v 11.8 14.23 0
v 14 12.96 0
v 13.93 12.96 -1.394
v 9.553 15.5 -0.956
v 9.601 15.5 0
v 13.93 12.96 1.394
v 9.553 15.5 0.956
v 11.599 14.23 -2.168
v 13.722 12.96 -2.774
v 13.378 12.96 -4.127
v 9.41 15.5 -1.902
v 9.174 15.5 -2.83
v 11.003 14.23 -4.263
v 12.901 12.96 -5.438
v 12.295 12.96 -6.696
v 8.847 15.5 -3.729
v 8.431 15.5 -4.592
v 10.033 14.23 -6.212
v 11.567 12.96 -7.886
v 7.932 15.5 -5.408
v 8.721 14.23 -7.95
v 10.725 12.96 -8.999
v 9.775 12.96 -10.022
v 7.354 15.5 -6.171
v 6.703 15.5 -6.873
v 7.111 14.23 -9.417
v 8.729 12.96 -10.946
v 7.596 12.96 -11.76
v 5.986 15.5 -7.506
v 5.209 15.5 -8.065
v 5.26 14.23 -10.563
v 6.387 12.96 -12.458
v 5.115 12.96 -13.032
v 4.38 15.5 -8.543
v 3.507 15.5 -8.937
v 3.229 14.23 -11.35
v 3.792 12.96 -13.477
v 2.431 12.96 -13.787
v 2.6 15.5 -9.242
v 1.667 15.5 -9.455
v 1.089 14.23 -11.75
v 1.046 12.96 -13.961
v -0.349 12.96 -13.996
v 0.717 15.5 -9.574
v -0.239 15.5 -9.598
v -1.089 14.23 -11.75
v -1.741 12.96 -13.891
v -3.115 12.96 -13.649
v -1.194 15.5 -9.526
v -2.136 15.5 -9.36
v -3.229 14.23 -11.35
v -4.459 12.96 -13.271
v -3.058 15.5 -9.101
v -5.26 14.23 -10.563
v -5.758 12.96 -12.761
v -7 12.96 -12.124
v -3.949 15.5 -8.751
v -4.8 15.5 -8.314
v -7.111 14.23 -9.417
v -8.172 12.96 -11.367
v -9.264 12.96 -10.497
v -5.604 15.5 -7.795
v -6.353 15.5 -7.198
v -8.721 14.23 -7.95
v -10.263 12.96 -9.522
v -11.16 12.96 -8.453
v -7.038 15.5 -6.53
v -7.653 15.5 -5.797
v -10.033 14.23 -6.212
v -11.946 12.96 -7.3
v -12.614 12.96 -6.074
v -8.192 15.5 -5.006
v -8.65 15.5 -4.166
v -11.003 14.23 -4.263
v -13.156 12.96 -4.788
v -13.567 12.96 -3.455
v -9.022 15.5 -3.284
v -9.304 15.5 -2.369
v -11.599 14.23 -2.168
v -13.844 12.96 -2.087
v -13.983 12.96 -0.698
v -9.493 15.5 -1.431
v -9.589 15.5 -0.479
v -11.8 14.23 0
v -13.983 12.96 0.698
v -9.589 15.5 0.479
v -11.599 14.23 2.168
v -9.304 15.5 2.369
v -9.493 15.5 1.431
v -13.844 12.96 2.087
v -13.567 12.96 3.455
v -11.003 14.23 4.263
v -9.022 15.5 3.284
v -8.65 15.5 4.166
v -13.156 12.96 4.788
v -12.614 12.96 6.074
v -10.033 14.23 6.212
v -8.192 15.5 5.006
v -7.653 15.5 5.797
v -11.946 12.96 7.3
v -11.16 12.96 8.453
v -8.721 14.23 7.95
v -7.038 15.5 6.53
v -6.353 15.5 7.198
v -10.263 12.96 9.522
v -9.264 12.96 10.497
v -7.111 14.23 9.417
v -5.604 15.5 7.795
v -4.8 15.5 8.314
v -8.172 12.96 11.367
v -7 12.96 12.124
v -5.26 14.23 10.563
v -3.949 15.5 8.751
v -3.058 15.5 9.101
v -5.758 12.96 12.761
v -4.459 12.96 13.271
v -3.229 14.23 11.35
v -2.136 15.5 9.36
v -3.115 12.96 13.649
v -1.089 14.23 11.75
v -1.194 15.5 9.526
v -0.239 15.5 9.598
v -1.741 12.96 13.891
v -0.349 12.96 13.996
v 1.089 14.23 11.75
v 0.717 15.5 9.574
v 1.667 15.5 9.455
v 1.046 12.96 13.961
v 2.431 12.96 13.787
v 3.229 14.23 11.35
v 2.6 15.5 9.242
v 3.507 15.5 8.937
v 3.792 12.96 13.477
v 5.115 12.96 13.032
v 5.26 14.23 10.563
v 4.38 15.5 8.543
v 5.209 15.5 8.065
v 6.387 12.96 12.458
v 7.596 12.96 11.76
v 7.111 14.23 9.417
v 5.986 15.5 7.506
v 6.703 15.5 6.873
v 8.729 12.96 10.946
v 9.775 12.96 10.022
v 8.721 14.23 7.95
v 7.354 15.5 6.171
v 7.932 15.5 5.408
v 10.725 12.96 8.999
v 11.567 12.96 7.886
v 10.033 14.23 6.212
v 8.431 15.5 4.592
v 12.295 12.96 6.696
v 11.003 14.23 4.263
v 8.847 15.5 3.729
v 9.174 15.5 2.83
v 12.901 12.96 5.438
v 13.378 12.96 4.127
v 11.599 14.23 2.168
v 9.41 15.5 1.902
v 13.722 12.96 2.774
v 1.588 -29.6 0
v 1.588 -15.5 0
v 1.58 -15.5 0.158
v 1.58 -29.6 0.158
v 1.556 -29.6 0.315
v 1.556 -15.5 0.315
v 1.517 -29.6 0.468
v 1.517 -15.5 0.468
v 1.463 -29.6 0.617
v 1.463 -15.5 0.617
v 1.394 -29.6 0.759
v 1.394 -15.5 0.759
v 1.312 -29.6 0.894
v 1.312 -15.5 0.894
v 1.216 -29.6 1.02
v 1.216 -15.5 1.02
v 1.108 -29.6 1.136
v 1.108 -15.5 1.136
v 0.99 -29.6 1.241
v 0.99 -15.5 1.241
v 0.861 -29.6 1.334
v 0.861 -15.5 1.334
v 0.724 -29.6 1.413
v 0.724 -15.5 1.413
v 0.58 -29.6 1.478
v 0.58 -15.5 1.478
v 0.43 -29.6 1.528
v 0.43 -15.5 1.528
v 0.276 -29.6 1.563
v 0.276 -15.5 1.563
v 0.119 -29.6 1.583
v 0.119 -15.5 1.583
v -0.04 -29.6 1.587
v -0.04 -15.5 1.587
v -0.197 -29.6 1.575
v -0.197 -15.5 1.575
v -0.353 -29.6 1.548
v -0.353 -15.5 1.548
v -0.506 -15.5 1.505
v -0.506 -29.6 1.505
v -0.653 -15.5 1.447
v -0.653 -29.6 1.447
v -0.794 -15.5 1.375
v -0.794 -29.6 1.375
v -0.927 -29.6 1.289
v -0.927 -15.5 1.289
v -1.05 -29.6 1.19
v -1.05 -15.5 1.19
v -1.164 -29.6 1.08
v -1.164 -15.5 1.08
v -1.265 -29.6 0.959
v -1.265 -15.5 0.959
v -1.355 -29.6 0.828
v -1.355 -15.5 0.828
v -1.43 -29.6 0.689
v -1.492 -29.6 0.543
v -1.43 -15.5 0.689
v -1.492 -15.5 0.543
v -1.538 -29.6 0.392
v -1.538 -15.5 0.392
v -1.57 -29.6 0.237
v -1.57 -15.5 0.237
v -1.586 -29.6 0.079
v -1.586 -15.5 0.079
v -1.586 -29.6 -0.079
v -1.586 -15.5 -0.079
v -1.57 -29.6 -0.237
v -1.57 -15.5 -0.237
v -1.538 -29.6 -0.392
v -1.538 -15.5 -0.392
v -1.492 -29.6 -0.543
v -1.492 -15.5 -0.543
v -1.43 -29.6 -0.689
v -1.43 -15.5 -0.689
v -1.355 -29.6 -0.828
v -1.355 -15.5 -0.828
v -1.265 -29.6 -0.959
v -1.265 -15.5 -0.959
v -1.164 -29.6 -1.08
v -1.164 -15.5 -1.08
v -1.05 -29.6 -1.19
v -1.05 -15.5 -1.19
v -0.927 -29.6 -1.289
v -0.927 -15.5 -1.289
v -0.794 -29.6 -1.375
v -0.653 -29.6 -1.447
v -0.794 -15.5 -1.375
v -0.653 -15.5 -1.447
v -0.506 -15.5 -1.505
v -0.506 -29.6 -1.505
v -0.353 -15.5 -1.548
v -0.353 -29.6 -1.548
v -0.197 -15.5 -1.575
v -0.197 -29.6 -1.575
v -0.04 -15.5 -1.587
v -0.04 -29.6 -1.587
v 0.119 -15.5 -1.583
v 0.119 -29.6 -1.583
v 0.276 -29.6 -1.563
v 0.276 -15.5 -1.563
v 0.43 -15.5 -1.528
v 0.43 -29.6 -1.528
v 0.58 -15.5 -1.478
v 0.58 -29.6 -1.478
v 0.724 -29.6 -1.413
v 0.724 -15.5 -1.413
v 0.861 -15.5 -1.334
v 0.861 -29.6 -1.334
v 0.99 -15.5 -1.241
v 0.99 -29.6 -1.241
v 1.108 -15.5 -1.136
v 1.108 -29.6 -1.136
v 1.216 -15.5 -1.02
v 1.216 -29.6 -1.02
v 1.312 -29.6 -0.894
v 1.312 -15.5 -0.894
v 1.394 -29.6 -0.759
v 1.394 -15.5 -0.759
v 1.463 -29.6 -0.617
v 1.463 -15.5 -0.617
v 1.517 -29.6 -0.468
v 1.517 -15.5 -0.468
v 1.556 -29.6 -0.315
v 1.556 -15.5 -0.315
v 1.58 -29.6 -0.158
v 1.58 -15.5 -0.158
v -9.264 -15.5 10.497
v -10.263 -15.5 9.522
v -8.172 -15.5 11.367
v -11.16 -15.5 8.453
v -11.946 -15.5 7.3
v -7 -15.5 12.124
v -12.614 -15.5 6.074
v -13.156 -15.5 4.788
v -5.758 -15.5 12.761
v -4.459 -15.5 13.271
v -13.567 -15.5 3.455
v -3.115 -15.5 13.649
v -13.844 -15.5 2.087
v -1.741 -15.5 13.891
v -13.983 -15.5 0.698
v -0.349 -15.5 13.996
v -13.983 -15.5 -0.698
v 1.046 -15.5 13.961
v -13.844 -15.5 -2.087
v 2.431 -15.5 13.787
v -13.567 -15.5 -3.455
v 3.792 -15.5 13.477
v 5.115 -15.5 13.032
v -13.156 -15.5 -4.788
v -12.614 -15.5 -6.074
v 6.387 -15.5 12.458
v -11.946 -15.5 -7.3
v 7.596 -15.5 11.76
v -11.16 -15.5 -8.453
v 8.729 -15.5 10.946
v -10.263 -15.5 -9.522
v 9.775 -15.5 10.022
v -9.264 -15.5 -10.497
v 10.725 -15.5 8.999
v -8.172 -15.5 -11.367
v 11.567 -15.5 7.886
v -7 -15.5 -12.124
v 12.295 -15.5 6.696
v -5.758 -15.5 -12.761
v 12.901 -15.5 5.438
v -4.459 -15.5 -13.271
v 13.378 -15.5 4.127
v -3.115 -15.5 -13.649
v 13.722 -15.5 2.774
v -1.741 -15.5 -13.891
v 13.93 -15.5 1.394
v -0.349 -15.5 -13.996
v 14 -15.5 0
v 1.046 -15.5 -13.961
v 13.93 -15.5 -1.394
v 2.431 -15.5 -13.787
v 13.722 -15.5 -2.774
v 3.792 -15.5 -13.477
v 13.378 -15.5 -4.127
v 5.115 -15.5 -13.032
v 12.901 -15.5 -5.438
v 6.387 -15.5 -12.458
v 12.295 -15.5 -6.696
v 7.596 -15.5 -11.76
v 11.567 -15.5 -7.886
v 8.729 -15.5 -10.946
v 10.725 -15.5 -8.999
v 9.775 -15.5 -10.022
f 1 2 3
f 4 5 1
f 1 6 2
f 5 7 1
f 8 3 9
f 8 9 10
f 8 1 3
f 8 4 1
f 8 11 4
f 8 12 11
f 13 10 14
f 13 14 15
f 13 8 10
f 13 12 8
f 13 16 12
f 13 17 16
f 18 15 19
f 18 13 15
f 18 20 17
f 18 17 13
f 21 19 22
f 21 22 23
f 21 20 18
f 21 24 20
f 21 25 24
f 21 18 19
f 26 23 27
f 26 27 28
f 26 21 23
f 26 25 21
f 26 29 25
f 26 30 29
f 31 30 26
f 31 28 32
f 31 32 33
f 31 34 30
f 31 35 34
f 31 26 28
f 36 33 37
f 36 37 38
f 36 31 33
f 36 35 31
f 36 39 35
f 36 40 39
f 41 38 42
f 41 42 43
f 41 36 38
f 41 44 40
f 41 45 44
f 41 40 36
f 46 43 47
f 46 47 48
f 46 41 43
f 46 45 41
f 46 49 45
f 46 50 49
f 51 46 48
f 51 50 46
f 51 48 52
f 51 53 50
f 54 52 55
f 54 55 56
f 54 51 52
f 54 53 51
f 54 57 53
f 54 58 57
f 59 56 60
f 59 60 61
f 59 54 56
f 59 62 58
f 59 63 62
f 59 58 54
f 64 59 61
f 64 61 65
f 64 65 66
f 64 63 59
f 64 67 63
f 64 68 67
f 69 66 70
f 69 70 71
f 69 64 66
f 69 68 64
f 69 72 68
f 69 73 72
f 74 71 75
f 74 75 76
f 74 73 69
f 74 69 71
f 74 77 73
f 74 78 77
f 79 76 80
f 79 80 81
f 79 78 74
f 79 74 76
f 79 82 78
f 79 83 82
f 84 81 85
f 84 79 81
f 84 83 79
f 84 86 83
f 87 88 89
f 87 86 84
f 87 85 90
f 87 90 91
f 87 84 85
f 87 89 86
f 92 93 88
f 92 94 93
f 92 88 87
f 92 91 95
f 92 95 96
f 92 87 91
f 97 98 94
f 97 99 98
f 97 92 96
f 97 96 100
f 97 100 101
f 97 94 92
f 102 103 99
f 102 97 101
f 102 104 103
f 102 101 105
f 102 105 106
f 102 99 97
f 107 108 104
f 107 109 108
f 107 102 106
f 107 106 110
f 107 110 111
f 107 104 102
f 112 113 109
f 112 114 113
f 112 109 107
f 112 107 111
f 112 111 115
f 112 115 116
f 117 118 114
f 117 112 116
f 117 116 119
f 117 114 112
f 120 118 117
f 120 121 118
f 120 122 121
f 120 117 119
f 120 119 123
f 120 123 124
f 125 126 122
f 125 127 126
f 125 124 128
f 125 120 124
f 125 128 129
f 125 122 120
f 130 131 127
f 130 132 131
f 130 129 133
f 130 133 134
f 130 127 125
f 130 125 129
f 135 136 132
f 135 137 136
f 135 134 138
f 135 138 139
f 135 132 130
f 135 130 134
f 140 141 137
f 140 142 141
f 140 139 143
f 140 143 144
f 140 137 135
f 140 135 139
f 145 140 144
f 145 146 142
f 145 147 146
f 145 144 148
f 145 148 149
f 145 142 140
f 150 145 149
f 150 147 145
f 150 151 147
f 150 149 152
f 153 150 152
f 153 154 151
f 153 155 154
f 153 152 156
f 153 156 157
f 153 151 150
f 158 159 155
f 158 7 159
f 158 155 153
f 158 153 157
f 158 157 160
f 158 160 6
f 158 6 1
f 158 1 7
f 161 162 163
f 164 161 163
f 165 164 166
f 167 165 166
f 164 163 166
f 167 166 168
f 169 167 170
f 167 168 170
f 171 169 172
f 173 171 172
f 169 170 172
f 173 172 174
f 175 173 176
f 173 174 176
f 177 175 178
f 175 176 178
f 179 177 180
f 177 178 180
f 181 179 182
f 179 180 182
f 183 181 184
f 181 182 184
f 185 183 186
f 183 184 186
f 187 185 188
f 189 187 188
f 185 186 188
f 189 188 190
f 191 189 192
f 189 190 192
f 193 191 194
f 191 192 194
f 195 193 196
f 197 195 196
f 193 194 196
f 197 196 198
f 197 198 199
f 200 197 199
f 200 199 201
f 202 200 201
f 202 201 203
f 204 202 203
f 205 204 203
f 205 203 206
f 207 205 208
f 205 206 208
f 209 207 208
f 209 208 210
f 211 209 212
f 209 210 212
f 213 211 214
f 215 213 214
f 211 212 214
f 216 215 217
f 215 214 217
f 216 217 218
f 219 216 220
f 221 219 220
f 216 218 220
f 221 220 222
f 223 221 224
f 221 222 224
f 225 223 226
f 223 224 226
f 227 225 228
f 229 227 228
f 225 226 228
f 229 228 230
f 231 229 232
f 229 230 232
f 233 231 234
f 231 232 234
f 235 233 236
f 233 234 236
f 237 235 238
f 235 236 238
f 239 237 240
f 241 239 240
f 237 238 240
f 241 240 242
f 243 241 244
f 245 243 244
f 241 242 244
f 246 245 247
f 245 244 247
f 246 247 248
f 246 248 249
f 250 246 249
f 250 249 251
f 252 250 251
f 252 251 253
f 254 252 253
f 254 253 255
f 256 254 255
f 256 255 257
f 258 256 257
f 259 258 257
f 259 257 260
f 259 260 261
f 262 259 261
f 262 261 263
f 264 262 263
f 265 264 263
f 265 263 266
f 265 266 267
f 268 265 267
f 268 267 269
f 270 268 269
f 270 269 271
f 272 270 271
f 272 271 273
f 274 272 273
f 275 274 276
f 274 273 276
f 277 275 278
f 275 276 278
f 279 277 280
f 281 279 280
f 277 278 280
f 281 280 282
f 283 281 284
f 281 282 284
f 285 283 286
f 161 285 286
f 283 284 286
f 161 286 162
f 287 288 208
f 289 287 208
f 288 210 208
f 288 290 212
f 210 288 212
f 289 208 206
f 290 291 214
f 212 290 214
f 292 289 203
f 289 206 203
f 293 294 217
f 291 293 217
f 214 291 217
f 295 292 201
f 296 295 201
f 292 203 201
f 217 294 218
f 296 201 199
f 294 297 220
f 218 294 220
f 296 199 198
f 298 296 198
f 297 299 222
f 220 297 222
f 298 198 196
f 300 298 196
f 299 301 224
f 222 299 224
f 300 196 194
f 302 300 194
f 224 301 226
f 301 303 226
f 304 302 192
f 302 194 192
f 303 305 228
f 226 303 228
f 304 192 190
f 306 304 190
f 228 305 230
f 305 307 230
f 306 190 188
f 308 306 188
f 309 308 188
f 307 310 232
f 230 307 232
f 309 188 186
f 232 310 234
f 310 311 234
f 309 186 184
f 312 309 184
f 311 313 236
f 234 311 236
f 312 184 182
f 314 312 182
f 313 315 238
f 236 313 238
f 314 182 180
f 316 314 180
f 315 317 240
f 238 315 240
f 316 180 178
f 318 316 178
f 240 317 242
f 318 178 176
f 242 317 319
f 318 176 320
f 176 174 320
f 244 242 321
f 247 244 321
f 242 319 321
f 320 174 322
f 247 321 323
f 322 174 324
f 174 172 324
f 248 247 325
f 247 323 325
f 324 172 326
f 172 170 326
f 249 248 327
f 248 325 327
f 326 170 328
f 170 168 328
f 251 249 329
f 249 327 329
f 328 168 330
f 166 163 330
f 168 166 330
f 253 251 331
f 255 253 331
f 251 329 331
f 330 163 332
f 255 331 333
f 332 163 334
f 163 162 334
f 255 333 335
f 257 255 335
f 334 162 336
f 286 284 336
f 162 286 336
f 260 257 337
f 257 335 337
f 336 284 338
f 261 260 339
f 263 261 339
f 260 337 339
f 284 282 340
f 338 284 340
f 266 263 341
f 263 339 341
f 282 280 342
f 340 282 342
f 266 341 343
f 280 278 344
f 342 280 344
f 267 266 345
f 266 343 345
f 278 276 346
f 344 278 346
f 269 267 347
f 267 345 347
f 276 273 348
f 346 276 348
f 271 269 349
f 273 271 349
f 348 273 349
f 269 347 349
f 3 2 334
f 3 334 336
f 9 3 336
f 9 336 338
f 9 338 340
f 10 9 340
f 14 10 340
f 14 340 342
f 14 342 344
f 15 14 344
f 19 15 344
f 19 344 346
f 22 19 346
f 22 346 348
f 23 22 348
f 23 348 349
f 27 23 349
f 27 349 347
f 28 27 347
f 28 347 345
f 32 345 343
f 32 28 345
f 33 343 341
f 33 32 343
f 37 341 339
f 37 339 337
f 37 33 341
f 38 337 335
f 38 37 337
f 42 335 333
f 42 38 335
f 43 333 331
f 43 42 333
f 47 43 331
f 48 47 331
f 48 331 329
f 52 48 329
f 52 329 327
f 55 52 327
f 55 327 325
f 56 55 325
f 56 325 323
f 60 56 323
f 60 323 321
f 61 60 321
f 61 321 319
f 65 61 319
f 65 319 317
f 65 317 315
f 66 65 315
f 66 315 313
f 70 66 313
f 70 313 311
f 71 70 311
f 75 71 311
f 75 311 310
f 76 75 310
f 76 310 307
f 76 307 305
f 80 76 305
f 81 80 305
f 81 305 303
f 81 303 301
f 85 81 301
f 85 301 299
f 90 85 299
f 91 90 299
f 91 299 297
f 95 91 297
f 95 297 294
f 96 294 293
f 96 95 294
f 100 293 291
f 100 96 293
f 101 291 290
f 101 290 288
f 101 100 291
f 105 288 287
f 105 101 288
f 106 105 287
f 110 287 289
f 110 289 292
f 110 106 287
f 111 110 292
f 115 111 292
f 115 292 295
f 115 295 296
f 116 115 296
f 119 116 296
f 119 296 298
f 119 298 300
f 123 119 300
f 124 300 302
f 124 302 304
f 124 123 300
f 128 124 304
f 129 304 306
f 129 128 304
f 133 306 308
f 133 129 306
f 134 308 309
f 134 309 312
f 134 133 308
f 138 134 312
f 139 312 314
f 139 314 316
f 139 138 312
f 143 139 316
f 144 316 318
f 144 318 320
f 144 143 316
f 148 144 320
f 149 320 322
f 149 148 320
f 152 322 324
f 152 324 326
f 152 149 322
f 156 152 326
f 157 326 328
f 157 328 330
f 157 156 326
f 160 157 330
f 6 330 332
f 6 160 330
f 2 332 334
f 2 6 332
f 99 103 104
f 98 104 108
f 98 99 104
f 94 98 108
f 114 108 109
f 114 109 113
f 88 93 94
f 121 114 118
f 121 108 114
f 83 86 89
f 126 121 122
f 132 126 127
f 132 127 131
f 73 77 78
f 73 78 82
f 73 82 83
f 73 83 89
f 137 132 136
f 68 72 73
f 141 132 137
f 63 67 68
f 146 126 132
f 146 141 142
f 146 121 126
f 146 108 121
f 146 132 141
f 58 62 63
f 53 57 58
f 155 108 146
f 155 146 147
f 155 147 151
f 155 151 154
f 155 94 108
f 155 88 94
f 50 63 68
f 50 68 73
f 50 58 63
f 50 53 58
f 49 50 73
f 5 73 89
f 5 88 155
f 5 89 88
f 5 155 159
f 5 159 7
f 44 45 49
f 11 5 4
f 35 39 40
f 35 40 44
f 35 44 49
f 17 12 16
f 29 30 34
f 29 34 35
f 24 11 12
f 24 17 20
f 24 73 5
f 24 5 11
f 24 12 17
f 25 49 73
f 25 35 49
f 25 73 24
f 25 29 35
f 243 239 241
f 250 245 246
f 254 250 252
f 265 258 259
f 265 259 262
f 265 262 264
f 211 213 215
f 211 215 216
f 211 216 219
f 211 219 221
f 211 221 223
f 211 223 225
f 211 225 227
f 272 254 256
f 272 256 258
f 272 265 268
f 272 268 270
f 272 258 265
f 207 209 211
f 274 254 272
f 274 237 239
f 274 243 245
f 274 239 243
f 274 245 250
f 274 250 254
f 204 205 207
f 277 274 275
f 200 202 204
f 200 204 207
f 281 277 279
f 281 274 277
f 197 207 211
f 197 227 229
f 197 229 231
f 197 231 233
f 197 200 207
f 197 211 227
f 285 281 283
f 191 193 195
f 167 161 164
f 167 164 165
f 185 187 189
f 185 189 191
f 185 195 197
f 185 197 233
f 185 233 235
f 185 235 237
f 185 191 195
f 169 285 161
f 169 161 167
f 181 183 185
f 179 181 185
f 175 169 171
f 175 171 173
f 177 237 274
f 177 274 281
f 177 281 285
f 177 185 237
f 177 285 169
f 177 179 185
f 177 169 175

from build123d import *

# Parameters (mm, degrees)
SKETCH1_R           = 14
BOSS_EXTRUDE1_DEPTH = 15.5
CHAMFER1_SIZE       = 2.54
CHAMFER1_SIZE2      = 4.399409051
SKETCH2_R           = 1.5875
BOSS_EXTRUDE2_DEPTH = 14.1


with BuildPart() as part:
    # Sketch1 → Boss-Extrude1 (new body, symmetric)
    with BuildSketch(Plane(origin=(0, 0, 0), x_dir=(1, 0, 0), z_dir=(0, 1, 0))):
        Circle(SKETCH1_R)
    extrude(amount=BOSS_EXTRUDE1_DEPTH, both=True)

    # Chamfer1
    chamfer1_edges = [part.edges().sort_by_distance(p)[0] for p in [
        (-14, 15.5, 0),
    ]]
    chamfer1_side = [part.faces().sort_by_distance(p)[0] for p in [
        (-14, 0, 0),
    ]]
    chamfer(chamfer1_edges, length=CHAMFER1_SIZE, length2=CHAMFER1_SIZE2, reference=chamfer1_side[0])

    # Sketch2 → Boss-Extrude2 (add)
    with BuildSketch(Plane.XZ.offset(15.5)):
        Circle(SKETCH2_R)
    extrude(amount=BOSS_EXTRUDE2_DEPTH)


solid = part.part
